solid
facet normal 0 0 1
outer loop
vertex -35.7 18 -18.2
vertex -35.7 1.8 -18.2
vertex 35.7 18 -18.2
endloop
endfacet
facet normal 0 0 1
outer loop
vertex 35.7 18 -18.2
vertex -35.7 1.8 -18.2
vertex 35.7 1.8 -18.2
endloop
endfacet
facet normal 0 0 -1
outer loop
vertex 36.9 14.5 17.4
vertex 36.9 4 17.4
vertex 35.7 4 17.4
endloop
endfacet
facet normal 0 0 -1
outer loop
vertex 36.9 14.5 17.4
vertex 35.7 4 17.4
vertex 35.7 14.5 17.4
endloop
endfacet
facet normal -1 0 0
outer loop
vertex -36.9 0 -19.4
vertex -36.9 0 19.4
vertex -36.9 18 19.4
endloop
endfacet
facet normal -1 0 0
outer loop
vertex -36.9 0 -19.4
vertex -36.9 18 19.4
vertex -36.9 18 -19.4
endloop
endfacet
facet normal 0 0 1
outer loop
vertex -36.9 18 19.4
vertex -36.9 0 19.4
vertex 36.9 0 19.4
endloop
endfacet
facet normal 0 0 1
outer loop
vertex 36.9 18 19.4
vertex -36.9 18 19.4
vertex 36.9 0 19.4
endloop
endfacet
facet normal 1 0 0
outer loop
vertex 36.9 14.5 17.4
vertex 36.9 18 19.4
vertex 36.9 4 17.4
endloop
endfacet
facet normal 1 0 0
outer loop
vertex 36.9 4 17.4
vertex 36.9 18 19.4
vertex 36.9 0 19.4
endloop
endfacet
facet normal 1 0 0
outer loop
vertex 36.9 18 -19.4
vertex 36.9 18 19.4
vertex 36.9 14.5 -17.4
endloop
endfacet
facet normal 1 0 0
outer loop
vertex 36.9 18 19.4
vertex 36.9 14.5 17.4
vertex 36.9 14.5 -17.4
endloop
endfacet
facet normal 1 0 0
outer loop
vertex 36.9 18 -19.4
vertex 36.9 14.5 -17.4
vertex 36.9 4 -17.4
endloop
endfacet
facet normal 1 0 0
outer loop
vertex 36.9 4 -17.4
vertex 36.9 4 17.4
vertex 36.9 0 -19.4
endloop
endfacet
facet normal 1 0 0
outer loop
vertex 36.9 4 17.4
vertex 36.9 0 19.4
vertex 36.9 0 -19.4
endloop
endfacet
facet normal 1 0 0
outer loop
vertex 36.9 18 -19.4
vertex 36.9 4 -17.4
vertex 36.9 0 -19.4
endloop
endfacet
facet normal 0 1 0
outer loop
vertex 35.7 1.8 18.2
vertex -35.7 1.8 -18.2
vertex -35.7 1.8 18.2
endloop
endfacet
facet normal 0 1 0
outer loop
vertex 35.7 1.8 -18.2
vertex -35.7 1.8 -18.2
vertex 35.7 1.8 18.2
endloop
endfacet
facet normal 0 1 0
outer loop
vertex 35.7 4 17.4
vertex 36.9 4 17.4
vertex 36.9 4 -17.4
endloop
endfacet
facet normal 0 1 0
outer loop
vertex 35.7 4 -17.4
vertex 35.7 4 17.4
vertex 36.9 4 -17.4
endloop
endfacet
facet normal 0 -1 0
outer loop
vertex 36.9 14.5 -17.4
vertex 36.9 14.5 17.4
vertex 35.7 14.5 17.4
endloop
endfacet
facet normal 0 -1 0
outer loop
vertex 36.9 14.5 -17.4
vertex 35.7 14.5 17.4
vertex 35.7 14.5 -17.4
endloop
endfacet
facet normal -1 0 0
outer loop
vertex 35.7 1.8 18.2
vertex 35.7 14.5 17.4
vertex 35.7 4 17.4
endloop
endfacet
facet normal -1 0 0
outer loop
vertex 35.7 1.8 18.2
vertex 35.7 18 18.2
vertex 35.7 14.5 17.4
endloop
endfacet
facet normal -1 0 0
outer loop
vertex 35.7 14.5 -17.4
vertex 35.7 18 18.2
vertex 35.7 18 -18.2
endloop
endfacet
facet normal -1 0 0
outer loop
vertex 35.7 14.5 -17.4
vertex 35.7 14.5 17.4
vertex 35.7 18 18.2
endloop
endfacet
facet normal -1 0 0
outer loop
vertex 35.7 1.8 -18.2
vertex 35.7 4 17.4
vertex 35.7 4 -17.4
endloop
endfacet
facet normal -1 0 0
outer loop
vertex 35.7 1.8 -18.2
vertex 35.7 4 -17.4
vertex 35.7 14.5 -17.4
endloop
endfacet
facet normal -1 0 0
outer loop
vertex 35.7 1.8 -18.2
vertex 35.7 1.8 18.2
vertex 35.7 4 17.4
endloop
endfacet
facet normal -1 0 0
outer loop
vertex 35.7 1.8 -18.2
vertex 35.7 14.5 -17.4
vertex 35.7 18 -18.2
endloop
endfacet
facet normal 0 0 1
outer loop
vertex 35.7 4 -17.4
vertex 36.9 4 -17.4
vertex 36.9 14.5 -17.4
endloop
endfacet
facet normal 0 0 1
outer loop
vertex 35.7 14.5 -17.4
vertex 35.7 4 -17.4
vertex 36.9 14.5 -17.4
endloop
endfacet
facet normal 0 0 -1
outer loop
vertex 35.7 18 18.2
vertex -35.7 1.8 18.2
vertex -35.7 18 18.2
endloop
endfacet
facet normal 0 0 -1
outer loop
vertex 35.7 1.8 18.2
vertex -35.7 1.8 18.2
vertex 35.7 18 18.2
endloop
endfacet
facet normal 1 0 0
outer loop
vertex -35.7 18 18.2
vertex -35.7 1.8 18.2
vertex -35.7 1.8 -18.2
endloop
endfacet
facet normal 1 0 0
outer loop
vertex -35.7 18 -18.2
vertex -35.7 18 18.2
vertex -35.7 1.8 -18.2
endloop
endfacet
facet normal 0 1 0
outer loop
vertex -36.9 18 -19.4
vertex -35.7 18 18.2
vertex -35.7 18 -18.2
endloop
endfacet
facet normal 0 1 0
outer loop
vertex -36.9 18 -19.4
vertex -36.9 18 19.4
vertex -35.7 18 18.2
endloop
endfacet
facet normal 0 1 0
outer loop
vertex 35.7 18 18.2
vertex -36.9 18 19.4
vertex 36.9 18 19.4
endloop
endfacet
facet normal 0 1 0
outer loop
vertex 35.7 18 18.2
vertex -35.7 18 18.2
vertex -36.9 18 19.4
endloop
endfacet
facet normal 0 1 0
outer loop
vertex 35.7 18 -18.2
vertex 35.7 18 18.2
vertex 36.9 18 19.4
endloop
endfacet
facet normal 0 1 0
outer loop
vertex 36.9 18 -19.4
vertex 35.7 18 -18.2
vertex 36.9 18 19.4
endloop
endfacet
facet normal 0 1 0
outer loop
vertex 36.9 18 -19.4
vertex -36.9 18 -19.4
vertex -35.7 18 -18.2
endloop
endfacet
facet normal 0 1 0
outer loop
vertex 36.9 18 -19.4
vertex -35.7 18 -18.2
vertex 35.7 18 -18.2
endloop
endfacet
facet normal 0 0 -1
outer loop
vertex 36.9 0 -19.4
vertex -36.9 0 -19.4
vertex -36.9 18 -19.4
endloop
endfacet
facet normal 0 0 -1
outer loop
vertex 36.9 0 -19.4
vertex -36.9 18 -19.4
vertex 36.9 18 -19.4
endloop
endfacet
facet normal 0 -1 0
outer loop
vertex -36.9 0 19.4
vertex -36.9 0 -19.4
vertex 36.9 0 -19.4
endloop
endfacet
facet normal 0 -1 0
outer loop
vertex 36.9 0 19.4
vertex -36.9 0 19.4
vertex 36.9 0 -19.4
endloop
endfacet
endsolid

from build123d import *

# Parameters (mm, degrees)
SKETCH1_W           = 73.8
SKETCH1_H           = 38.8
SKETCH1_W_2         = 71.4
SKETCH1_H_2         = 36.4
BOSS_EXTRUDE1_DEPTH = 1.8
SKETCH1_3_W         = 73.8
SKETCH1_3_H         = 38.8
SKETCH1_3_W_2       = 71.4
SKETCH1_3_H_2       = 36.4
BOSS_EXTRUDE2_DEPTH = 18
SKETCH2_W           = 34.8
SKETCH2_H           = 10.5
CUT_EXTRUDE1_DEPTH  = 1.2


with BuildPart() as part:
    # Sketch1 → Boss-Extrude1 (new body)
    with BuildSketch(Plane(origin=(0, 0, 0), x_dir=(1, 0, 0), z_dir=(0, 1, 0))):
        Rectangle(SKETCH1_W, SKETCH1_H)
        Rectangle(SKETCH1_W_2, SKETCH1_H_2, mode=Mode.SUBTRACT)
        Rectangle(SKETCH1_W_2, SKETCH1_H_2)
    extrude(amount=BOSS_EXTRUDE1_DEPTH)

    # Sketch1<3> → Boss-Extrude2 (add)
    with BuildSketch(Plane(origin=(0, 0, 0), x_dir=(1, 0, 0), z_dir=(0, 1, 0))):
        Rectangle(SKETCH1_3_W, SKETCH1_3_H)
        Rectangle(SKETCH1_3_W_2, SKETCH1_3_H_2, mode=Mode.SUBTRACT)
    extrude(amount=BOSS_EXTRUDE2_DEPTH)

    # Sketch2 → Cut-Extrude1 (cut)
    with BuildSketch(Plane(origin=(36.9, 0, 0), x_dir=(0, 0, -1), z_dir=(1, 0, 0))):
        with Locations((0, 9.25)):
            Rectangle(SKETCH2_W, SKETCH2_H)
    extrude(amount=-CUT_EXTRUDE1_DEPTH, mode=Mode.SUBTRACT)


solid = part.part
